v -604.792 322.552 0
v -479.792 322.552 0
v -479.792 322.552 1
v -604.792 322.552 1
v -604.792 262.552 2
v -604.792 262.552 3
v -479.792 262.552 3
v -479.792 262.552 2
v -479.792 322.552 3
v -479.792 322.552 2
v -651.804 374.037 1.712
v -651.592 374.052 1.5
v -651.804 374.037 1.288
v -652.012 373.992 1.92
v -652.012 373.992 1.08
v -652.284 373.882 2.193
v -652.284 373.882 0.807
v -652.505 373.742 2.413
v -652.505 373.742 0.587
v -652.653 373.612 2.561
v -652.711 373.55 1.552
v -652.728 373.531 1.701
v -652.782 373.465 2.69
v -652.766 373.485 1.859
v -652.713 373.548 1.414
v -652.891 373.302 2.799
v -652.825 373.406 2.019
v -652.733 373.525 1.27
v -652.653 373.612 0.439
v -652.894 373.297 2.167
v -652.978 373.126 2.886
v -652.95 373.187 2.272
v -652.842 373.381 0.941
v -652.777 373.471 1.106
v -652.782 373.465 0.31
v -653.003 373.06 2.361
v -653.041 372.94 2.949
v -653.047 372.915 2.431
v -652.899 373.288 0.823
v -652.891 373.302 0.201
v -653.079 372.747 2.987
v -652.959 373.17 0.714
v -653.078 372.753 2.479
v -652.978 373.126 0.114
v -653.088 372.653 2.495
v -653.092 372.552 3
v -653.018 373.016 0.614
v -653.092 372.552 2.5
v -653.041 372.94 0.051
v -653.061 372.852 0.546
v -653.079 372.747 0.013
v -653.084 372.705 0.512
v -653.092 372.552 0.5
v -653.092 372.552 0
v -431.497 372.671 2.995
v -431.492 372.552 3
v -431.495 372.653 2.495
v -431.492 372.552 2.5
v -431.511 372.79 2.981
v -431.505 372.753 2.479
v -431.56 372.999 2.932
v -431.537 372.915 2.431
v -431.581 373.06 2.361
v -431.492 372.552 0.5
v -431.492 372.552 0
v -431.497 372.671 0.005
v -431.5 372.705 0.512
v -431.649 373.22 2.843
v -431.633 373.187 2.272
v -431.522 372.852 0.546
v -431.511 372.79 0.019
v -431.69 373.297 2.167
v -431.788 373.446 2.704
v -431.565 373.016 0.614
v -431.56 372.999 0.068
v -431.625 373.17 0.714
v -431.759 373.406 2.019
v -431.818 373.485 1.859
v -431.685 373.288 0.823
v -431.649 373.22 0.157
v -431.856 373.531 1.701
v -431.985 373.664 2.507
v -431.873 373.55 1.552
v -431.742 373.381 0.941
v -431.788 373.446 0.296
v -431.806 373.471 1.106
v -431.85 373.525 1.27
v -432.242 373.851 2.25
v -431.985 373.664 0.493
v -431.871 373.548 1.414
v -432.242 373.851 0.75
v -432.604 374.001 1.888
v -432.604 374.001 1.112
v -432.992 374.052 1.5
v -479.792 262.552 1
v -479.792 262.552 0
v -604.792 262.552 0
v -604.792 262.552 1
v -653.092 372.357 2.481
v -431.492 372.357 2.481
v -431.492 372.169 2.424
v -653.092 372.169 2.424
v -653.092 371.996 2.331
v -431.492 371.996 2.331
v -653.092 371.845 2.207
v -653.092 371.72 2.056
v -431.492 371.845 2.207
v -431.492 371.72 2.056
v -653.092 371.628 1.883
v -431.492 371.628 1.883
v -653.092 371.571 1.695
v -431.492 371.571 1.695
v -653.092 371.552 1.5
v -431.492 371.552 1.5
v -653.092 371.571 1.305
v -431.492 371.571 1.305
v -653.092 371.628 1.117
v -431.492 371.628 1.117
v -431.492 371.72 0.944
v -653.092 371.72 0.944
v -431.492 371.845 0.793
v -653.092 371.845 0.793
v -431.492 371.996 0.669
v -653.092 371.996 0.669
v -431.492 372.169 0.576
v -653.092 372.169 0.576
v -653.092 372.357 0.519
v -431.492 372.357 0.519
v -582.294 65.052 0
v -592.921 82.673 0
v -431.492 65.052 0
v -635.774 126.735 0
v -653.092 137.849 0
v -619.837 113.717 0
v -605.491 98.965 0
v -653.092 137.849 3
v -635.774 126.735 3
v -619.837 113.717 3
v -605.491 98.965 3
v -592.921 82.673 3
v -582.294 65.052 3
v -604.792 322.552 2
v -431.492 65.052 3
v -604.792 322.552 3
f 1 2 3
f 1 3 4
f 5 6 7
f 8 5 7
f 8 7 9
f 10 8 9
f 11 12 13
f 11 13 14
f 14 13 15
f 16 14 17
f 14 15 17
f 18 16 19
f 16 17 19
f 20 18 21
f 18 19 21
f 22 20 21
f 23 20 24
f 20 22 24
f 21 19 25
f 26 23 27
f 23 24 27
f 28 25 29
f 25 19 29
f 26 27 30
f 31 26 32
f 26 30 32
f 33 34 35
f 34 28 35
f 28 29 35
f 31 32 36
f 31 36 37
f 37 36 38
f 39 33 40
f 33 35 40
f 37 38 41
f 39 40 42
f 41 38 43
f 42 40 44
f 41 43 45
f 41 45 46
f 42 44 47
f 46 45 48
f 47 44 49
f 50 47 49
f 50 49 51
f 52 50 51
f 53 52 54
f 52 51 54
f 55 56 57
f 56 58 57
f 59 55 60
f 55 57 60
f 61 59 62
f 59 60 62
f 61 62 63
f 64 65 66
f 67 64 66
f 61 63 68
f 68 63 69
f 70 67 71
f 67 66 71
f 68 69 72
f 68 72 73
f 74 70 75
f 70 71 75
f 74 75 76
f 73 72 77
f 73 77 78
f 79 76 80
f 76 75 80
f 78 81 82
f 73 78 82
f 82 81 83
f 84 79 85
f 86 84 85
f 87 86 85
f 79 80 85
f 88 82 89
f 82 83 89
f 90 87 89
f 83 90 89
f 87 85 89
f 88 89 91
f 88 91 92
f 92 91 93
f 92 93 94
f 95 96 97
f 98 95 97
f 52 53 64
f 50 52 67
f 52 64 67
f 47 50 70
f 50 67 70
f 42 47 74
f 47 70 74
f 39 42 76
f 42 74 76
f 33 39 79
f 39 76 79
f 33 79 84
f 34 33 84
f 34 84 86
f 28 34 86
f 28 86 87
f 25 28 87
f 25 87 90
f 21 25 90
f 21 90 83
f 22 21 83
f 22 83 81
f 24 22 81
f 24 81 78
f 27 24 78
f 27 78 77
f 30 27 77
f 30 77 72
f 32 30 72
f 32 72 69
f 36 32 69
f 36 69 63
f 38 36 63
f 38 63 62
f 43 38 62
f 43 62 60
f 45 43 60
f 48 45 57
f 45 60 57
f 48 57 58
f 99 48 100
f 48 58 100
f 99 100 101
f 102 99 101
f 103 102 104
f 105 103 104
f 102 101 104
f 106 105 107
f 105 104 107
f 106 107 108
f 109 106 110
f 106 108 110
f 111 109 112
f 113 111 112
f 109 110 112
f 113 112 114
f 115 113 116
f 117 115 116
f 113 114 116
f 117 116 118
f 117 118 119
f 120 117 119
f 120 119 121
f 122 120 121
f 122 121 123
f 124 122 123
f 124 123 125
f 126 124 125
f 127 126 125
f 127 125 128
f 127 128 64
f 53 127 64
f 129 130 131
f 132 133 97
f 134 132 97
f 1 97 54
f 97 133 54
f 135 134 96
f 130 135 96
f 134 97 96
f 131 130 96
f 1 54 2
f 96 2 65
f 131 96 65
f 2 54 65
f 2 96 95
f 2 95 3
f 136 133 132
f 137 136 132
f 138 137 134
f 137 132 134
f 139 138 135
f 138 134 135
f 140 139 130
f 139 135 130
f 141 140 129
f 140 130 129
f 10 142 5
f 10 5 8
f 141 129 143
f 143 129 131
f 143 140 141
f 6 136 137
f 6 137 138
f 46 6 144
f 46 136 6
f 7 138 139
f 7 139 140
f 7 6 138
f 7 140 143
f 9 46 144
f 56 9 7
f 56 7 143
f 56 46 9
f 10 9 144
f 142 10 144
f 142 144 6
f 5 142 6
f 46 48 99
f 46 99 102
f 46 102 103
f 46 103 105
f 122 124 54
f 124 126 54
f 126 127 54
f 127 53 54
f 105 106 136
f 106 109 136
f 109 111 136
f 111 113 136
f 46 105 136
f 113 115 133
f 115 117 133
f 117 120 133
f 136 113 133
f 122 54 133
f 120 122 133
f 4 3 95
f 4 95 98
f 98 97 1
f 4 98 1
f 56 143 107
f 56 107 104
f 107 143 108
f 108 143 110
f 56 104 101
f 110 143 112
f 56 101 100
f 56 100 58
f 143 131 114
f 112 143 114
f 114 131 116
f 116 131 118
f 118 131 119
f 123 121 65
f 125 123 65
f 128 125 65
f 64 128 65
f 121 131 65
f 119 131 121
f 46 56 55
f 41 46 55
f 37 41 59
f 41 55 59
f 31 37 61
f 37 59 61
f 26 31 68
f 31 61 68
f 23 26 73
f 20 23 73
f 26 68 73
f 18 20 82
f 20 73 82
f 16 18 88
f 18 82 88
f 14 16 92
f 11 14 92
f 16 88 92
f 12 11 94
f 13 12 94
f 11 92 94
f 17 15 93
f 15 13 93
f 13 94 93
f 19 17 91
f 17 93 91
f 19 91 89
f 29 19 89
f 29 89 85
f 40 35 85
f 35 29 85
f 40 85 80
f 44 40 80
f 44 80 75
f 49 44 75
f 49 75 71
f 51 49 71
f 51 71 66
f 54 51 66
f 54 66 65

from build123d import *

# Parameters (mm, degrees)
EXTRUDE_1_DEPTH     = 3
SKETCH_3_R          = 1
CUT_EXTRUDE_1_DEPTH = 435.775999416
FILLET_1_R          = 1.5
SKETCH_4_W          = 125
SKETCH_4_H          = 60
CUT_EXTRUDE_2_DEPTH = 1
CUT_EXTRUDE_3_DEPTH = 1


with BuildPart() as part:
    # 草图1 → 凸台-拉伸1 (new body)
    with BuildSketch(Plane.XY):
        with BuildLine():
            Line((-582.293881309, 65.051613642), (-431.491871246, 65.051613642))
            Line((-431.491871246, 65.051613642), (-431.491871246, 374.051613642))
            Line((-431.491871246, 374.051613642), (-653.091871246, 374.051613642))
            Line((-653.091871246, 374.051613642), (-653.091871246, 137.849062601))
            ThreePointArc((-653.091871246, 137.849062601), (-612.452891481, 106.546401187), (-582.293881309, 65.051613642))
        make_face()
    extrude(amount=EXTRUDE_1_DEPTH)

    # 草图3 → 切除-拉伸1 (cut, through all)
    with BuildSketch(Plane(origin=(-431.491871246, 0, 0), x_dir=(0, 0, -1), z_dir=(1, 0, 0))):
        with Locations((-1.5, 372.551613642)):
            Circle(SKETCH_3_R)
    extrude(amount=-CUT_EXTRUDE_1_DEPTH, mode=Mode.SUBTRACT)

    # 圆角1
    # the kernel refuses this fillet: 1.5 mm, written as the material it takes off along each edge
    with BuildSketch(Plane(origin=(-653.091871246, 374.051613642, -3.75), x_dir=(0, -1, 0), z_dir=(0, 0, 1)), Plane(origin=(-431.491871246, 374.051613642, -3.75), x_dir=(-1, 0, 0), z_dir=(0, 0, 1))) as fillet_1_piece_1:
        with BuildLine():
            CenterArc((FILLET_1_R, FILLET_1_R), FILLET_1_R, 180, 90)
            Line((0, FILLET_1_R), (0, 0))
            Line((0, 0), (FILLET_1_R, 0))
        make_face()
    extrude(amount=10.5, mode=Mode.SUBTRACT)
    with BuildSketch(Plane(origin=(-427.741871246, 374.051613642, 3), x_dir=(0, -1, 0), z_dir=(-1, 0, 0))) as fillet_1_piece_2:
        with BuildLine():
            CenterArc((FILLET_1_R, -FILLET_1_R), FILLET_1_R, 90, 90)
            Line((0, -FILLET_1_R), (0, 0))
            Line((0, 0), (FILLET_1_R, 0))
        make_face()
    extrude(amount=229.1, mode=Mode.SUBTRACT)
    with BuildSketch(Plane(origin=(-427.741871246, 374.051613642, 0), x_dir=(0, -1, 0), z_dir=(-1, 0, 0))) as fillet_1_piece_3:
        with BuildLine():
            CenterArc((FILLET_1_R, FILLET_1_R), FILLET_1_R, 180, 90)
            Line((0, FILLET_1_R), (0, 0))
            Line((0, 0), (FILLET_1_R, 0))
        make_face()
    extrude(amount=229.1, mode=Mode.SUBTRACT)

    # 草图4 → 切除-拉伸2 (cut)
    with BuildSketch(Plane(origin=(0, 0, 0), x_dir=(-1, 0, 0), z_dir=(0, 0, -1))):
        with Locations((542.291871246, 292.551613642)):
            Rectangle(SKETCH_4_W, SKETCH_4_H)
    extrude(amount=-CUT_EXTRUDE_2_DEPTH, mode=Mode.SUBTRACT)

    # 草图5 → 切除-拉伸3 (cut)
    with BuildSketch(Plane.XY.offset(3)):
        Polygon((-479.791871246, 322.551613642), (-500.741871246, 322.551613642), (-542.291871246, 292.551613642), (-500.741871246, 262.551613642), (-479.791871246, 262.551613642), align=None)
        Polygon((-500.741871246, 322.551613642), (-583.841871246, 322.551613642), (-542.291871246, 292.551613642), align=None)
        Polygon((-542.291871246, 292.551613642), (-583.841871246, 322.551613642), (-604.791871246, 322.551613642), (-604.791871246, 262.551613642), (-583.841871246, 262.551613642), align=None)
        Polygon((-542.291871246, 292.551613642), (-583.841871246, 262.551613642), (-500.741871246, 262.551613642), align=None)
    extrude(amount=-CUT_EXTRUDE_3_DEPTH, mode=Mode.SUBTRACT)


solid = part.part
